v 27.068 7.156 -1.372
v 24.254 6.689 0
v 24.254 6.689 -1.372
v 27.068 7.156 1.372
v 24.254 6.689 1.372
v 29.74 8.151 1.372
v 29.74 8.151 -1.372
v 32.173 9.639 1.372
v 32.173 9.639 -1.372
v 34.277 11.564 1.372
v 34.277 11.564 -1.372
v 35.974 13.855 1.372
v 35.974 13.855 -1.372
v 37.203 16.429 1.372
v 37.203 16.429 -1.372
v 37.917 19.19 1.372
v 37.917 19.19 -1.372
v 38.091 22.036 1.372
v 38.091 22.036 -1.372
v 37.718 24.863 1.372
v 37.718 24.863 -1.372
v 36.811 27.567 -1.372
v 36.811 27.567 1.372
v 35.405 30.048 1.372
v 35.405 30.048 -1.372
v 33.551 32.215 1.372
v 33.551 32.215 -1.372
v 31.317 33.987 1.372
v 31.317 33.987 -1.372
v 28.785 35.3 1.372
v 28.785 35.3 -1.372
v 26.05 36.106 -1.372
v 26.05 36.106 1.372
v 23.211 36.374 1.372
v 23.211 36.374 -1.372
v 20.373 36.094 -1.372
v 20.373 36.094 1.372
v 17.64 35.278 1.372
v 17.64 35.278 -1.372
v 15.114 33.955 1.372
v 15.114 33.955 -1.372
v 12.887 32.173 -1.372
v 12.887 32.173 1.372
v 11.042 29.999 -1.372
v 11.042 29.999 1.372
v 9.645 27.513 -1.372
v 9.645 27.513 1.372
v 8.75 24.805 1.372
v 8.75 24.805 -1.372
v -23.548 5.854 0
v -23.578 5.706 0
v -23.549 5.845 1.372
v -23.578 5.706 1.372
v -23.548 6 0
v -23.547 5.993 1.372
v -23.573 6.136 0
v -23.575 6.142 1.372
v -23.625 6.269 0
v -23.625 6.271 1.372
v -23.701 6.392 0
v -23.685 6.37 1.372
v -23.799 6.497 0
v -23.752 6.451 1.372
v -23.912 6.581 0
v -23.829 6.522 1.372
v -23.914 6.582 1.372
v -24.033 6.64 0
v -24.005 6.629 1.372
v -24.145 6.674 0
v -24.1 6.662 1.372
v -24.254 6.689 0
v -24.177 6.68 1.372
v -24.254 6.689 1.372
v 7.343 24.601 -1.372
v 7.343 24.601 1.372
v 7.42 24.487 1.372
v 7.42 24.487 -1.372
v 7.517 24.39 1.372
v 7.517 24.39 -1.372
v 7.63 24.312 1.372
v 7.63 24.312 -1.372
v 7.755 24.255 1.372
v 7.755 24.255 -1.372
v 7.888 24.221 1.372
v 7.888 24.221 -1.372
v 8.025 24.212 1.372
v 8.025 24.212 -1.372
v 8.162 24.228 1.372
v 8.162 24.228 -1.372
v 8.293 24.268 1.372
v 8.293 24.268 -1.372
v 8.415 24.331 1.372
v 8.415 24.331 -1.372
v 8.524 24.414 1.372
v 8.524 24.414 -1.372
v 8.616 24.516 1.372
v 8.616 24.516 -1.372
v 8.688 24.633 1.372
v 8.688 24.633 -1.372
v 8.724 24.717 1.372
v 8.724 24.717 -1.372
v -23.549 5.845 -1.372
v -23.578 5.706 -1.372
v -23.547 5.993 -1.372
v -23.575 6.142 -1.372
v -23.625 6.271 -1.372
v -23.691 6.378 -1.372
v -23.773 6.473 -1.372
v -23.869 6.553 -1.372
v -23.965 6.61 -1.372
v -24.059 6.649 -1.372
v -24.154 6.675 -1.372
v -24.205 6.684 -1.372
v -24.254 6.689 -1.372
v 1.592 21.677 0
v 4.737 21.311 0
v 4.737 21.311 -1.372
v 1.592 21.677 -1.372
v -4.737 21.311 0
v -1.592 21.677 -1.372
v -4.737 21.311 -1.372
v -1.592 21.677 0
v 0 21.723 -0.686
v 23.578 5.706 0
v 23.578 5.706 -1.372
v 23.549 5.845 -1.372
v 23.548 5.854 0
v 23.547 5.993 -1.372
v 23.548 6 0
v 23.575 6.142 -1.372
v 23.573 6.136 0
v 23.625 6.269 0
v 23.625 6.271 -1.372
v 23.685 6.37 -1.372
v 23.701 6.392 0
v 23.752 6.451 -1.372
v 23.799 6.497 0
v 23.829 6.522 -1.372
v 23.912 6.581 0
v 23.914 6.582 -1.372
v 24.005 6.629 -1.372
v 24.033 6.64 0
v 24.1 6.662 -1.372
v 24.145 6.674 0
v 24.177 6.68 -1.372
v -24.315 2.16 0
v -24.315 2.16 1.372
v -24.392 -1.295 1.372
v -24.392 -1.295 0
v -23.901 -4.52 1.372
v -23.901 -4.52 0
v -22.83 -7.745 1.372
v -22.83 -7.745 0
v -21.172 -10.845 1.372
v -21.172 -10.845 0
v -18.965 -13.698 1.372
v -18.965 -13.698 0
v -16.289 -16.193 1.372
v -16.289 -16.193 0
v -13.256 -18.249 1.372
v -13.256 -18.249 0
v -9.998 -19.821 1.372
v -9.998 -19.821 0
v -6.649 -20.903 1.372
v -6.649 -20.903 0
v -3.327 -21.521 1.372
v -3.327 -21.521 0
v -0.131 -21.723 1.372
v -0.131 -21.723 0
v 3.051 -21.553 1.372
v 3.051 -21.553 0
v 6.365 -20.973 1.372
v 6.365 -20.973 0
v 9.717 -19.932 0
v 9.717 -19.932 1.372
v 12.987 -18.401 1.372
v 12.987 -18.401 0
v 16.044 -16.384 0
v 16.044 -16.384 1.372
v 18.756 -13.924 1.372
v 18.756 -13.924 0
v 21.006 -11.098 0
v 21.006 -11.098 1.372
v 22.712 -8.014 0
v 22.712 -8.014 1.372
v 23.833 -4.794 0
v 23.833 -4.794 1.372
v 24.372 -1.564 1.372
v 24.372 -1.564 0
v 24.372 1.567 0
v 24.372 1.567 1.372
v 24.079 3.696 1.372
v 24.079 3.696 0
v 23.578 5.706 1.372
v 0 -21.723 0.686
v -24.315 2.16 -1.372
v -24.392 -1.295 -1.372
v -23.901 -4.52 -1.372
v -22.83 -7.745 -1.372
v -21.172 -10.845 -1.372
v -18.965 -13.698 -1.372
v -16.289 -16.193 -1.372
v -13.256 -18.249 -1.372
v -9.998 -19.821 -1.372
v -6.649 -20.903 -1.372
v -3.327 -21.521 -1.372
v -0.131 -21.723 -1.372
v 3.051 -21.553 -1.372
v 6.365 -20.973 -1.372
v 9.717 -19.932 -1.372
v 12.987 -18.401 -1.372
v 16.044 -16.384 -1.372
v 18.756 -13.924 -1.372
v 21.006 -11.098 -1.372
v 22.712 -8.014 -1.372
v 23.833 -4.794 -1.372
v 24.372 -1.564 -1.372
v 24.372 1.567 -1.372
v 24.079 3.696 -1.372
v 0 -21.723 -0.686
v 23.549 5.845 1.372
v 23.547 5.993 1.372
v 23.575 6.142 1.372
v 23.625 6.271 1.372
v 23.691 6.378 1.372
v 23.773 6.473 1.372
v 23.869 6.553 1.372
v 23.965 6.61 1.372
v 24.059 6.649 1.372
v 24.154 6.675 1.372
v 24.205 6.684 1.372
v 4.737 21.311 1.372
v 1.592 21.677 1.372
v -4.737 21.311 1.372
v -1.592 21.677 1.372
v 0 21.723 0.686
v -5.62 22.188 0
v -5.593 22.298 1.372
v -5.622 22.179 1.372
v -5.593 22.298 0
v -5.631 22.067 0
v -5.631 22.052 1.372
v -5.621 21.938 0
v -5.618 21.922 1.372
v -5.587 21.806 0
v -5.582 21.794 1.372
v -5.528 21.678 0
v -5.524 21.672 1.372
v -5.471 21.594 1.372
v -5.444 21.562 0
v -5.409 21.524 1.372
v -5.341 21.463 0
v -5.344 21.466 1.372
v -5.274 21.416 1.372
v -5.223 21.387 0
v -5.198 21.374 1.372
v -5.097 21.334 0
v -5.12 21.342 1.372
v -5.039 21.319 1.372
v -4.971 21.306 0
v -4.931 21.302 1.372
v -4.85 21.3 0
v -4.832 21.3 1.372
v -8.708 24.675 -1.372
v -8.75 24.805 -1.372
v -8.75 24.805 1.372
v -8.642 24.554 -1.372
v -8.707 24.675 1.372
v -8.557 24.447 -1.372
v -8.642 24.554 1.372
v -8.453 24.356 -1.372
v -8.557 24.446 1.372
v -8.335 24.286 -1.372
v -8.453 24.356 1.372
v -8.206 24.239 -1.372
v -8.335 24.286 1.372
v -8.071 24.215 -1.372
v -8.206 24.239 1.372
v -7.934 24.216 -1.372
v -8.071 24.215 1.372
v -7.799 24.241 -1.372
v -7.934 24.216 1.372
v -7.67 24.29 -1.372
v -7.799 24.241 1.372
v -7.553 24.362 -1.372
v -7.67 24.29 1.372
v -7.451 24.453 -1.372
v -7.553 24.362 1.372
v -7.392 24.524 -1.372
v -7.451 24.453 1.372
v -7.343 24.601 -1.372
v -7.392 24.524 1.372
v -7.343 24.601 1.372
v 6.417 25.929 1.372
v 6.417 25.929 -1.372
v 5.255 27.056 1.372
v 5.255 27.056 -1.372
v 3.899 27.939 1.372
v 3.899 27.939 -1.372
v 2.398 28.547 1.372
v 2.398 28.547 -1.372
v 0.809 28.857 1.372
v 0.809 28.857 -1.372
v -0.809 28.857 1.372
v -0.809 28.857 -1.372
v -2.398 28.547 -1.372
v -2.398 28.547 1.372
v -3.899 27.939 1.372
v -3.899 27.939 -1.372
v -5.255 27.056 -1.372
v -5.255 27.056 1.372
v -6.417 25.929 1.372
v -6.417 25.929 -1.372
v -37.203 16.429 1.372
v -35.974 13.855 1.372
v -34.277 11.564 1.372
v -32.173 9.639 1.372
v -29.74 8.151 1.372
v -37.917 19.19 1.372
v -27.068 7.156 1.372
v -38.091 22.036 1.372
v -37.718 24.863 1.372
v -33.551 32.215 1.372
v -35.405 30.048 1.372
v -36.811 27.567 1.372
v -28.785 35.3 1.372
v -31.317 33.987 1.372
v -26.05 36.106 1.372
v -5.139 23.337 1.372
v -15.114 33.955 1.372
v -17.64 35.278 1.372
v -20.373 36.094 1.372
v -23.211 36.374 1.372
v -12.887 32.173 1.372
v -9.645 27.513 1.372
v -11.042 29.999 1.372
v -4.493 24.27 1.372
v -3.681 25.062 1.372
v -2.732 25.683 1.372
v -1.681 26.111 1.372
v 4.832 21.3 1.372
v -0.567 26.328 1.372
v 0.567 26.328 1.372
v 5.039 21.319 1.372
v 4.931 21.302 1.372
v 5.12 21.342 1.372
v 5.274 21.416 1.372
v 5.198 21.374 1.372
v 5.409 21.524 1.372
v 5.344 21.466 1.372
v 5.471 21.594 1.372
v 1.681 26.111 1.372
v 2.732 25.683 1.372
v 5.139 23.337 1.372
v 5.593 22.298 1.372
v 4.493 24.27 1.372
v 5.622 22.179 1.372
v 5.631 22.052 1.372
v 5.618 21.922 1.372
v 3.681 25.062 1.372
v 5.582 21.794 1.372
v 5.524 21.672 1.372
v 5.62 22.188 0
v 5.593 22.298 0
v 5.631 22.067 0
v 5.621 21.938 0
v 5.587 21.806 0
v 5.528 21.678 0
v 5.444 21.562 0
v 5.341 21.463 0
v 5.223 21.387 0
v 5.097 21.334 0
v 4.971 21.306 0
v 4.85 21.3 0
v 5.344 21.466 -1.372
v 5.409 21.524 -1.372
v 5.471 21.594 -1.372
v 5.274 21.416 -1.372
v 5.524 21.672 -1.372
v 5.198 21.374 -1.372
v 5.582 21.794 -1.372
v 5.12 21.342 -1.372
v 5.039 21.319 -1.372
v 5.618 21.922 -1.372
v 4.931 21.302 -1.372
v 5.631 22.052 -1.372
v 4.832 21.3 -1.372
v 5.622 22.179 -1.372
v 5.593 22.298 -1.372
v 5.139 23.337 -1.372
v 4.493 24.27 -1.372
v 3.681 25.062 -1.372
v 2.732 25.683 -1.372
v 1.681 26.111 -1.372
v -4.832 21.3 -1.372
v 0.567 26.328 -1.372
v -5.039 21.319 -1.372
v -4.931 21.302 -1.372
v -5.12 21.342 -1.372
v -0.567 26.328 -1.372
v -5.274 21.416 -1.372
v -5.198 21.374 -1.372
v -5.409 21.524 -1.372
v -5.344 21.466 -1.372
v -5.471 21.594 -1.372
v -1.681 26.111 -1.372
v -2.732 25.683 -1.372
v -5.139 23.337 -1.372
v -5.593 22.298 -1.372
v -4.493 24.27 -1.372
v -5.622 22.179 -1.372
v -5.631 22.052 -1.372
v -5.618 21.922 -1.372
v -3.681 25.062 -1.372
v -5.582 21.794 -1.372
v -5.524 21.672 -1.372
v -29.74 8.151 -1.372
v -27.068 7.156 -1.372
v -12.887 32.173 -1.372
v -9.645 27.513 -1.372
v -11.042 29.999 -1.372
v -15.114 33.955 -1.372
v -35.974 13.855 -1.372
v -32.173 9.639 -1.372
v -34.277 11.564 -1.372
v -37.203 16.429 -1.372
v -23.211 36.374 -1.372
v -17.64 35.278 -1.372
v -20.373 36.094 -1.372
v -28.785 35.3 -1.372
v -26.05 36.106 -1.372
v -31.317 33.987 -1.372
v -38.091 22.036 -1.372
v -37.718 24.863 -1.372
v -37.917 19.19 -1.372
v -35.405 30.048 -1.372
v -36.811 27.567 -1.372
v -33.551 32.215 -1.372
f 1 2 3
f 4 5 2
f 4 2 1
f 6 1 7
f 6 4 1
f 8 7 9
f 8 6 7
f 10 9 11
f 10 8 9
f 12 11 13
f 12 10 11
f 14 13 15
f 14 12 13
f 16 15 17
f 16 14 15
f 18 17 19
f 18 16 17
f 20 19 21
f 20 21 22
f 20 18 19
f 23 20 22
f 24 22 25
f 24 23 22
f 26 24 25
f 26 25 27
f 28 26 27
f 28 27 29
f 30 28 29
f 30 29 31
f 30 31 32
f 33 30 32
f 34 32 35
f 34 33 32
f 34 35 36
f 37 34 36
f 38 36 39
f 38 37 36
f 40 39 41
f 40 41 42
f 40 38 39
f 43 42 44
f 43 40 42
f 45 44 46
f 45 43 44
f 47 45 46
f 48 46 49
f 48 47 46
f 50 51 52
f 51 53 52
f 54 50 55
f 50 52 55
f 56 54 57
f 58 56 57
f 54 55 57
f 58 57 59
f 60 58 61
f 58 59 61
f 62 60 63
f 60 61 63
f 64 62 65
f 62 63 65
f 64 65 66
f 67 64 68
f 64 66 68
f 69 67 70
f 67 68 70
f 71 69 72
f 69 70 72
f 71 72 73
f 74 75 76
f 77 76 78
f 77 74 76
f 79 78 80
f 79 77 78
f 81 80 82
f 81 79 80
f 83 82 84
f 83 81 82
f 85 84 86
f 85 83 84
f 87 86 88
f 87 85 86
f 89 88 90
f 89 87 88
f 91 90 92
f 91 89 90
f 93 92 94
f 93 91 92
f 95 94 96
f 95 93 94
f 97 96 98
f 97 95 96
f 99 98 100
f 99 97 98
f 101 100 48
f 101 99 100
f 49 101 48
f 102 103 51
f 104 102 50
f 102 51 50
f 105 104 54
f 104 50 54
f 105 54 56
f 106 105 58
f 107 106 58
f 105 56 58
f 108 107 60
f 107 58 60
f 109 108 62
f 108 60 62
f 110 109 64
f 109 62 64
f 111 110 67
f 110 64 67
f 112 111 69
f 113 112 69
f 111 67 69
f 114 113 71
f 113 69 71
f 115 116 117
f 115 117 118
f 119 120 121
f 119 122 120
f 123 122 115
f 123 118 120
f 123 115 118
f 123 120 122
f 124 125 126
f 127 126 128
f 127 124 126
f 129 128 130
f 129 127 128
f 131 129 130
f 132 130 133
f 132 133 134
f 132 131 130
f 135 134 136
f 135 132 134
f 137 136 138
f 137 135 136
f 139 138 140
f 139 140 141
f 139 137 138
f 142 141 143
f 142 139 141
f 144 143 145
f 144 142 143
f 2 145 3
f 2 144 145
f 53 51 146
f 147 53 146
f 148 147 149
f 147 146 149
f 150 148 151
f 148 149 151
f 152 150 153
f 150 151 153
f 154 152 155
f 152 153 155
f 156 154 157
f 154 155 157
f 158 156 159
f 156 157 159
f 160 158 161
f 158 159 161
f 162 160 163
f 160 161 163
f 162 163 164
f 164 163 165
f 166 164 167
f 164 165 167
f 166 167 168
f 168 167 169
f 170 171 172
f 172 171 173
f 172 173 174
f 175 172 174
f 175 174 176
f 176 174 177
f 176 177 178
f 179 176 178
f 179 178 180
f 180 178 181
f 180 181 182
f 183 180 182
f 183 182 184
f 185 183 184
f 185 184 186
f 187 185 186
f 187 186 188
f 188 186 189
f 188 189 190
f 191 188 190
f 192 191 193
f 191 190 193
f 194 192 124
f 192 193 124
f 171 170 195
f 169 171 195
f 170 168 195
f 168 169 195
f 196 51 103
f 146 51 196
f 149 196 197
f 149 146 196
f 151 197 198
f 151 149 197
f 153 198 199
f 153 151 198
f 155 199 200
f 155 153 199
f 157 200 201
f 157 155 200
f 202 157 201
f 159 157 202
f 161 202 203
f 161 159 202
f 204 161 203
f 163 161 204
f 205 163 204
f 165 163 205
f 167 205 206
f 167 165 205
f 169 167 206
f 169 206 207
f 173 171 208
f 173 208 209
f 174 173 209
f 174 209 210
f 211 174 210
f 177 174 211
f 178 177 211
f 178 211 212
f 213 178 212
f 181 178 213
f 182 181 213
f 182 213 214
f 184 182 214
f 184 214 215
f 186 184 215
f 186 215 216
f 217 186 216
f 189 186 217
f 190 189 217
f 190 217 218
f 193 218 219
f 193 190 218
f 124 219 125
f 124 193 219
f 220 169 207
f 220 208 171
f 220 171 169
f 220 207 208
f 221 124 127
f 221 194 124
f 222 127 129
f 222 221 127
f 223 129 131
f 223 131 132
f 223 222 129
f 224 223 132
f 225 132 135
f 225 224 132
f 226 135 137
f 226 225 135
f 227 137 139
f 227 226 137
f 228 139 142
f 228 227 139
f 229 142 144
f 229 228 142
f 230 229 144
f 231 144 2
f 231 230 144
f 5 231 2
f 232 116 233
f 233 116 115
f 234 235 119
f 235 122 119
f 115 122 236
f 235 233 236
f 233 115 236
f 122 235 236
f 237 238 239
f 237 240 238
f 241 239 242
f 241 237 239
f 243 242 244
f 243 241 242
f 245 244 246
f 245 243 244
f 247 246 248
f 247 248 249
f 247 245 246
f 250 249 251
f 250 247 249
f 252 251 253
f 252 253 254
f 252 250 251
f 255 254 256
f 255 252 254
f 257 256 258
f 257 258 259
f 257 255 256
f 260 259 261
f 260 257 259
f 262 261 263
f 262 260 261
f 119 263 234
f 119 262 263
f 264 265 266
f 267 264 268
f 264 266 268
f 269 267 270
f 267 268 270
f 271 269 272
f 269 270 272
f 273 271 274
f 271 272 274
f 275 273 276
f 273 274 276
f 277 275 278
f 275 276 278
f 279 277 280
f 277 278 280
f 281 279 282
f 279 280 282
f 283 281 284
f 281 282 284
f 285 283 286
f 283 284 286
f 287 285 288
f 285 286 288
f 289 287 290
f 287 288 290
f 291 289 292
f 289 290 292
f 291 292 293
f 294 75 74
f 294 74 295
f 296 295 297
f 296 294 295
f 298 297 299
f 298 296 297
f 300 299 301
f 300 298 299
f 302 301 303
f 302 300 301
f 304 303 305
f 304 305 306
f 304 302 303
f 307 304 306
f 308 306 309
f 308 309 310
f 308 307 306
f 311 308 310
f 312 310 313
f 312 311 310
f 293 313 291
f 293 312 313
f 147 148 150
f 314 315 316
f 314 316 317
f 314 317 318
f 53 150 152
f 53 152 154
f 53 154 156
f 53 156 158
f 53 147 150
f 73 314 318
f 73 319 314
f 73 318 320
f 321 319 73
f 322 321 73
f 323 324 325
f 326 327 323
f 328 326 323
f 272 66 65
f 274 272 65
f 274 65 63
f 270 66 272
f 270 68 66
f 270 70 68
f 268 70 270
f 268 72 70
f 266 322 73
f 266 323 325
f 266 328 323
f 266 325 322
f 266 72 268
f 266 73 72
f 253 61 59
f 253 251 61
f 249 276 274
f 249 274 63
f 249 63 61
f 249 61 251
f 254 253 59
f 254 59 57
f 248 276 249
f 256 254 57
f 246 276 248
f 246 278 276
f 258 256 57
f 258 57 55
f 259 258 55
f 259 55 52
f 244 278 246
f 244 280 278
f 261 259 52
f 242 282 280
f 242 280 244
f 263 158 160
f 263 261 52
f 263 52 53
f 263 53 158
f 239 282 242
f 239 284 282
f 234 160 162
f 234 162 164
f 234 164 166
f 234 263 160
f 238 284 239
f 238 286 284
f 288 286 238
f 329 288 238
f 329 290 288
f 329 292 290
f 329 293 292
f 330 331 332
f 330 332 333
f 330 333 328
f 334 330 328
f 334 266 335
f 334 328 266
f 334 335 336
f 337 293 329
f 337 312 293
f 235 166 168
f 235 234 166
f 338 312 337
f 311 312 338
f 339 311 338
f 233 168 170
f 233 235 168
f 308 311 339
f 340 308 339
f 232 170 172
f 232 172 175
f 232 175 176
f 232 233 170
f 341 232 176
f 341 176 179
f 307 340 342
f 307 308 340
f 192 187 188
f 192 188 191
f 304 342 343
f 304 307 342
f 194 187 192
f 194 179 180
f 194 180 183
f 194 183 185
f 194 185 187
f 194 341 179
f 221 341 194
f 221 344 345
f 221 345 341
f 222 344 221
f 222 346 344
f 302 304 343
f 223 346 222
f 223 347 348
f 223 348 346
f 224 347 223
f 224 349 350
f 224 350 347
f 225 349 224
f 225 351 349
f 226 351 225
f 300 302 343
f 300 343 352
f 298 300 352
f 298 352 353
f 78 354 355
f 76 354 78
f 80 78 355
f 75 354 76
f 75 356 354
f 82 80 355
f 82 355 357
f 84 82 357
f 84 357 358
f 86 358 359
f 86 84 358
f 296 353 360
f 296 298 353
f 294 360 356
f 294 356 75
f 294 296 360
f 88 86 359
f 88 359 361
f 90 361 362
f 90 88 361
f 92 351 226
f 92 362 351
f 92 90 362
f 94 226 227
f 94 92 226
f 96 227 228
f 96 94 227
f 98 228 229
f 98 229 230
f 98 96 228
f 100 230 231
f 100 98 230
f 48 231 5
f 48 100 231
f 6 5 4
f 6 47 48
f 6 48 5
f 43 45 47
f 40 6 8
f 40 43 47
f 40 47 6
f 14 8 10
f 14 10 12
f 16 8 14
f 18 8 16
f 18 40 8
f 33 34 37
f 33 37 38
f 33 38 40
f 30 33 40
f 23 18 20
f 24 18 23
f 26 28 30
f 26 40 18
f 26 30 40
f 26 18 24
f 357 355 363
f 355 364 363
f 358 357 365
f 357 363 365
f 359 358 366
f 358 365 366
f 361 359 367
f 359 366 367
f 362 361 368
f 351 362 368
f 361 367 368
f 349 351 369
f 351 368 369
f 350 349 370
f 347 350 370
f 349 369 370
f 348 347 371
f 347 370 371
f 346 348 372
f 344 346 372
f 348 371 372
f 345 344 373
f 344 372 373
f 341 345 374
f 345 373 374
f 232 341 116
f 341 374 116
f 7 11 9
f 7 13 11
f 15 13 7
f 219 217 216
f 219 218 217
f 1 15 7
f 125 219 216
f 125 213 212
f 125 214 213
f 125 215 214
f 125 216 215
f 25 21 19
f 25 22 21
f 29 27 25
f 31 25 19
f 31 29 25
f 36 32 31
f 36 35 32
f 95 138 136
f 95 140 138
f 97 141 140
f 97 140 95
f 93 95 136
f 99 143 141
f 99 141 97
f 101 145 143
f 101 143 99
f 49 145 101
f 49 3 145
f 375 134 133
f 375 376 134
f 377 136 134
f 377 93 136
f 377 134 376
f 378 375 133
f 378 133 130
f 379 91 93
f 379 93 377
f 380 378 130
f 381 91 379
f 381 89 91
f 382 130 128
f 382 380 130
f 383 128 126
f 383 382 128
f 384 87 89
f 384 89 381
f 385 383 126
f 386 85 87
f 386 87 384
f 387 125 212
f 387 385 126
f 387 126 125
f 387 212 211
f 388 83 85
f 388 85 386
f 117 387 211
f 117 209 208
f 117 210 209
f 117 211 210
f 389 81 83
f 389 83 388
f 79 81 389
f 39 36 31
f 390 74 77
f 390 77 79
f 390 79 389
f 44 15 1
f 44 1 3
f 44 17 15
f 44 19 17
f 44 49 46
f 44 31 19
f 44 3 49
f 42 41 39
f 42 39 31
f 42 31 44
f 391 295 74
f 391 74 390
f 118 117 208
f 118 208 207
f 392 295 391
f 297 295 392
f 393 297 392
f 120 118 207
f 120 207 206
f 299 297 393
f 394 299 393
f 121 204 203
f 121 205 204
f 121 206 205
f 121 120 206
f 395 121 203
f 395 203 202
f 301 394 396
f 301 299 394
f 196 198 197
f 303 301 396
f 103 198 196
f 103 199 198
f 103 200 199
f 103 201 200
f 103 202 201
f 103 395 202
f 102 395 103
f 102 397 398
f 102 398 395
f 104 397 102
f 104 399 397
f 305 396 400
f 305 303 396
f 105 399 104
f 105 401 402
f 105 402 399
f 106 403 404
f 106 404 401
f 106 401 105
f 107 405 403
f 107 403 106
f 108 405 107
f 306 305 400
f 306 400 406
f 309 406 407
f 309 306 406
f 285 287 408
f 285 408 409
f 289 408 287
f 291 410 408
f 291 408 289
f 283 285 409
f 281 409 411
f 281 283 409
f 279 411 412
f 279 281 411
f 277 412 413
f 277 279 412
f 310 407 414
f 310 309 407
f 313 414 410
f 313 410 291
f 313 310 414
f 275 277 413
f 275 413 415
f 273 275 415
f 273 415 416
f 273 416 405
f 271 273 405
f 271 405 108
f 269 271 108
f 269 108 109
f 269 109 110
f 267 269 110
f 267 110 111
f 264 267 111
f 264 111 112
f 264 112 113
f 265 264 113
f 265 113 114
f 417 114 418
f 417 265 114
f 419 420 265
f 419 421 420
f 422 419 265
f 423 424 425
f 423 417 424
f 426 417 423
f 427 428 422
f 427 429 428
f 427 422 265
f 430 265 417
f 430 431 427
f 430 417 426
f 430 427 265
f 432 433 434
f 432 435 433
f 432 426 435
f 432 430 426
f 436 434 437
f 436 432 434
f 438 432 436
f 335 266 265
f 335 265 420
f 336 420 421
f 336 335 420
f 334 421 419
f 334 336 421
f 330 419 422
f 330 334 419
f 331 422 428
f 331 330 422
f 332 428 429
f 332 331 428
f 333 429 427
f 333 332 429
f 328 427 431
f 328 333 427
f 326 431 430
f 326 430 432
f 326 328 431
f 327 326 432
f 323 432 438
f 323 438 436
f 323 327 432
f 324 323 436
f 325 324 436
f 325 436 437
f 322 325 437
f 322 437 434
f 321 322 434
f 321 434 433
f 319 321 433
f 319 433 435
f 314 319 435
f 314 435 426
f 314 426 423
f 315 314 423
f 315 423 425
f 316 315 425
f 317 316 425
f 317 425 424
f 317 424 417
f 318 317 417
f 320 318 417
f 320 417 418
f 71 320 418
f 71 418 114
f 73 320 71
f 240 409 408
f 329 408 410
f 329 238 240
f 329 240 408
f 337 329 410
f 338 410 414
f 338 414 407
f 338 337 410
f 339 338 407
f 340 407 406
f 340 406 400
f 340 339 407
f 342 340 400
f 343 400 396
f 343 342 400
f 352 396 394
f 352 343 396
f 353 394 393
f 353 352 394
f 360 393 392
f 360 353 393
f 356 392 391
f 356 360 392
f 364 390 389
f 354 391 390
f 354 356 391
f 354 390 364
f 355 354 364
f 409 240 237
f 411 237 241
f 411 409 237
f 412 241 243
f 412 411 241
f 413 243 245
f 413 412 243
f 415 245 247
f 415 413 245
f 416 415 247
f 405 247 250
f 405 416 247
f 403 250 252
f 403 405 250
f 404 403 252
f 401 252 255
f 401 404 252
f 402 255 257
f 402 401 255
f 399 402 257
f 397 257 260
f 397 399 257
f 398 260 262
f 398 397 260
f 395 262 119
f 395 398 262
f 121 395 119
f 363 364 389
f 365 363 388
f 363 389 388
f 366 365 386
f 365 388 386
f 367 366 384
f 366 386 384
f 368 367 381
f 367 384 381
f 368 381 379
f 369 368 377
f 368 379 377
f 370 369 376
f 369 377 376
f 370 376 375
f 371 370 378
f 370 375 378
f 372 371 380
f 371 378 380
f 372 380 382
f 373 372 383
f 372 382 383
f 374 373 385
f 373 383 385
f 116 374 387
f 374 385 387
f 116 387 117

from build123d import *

# Parameters (mm, degrees)
F1_DEPTH      = 1.3716
F3_DEPTH      = 1.3716
F3_DEPTH_BACK = 1.3716
F4_R          = 0.762


# Not quite as in the source:
# - a feature names something its author has since deleted; it is built from what else it names


with BuildPart() as f1:
    # F0 (on Top) → F1 (new body, symmetric)
    with BuildSketch(Plane.XY):
        with BuildLine():
            ThreePointArc((-8.4232286975, 20.3914902339), (-33.3355583029, 32.417888511), (-23.260879727, 6.6543624814))
            add(Edge.make_bspline(
                [(-23.260879727, 6.6543624814), (-33.5330229603, -21.7229145667), (0, -21.7229145667), (33.5330229603, -21.7229145667), (23.260879727, 6.6543624814)],
                knots=[2.8302582369, 2.8302582369, 2.8302582369, 4.7123889804, 4.7123889804, 6.5945197238, 6.5945197238, 6.5945197238], degree=2, weights=[1, 0.5889273409, 1, 0.5889273409, 1]))
            ThreePointArc((23.260879727, 6.6543624814), (33.3355583029, 32.417888511), (8.4232286975, 20.3914902339))
            add(Edge.make_bspline(
                [(8.4232286975, 20.3914902339), (0, 23.1412717688), (-8.4232286975, 20.3914902339)],
                knots=[1.2188651396, 1.2188651396, 1.2188651396, 1.922727514, 1.922727514, 1.922727514], degree=2, weights=[1, 0.9387087617, 1]))
        make_face()
    extrude(amount=F1_DEPTH, both=True)

    # F2 (on Top) → F3 (join, two sides)
    with BuildSketch(Plane.XY) as f3_sk:
        with BuildLine():
            add(Edge.make_bspline(
                [(8.4232286975, 20.3914902339), (7.1587937107, 20.8042678164), (5.8509839512, 21.0909933818)],
                knots=[1.2188651396, 1.2188651396, 1.2188651396, 1.3290021299, 1.3290021299, 1.3290021299], degree=2, weights=[1, 0.9984841136, 1]))
            ThreePointArc((8.4232286975, 20.3914902339), (0, 28.8958069319), (-8.4232286975, 20.3914902339))
            add(Edge.make_bspline(
                [(-5.8509839512, 21.0909933818), (-7.1587937107, 20.8042678164), (-8.4232286975, 20.3914902339)],
                knots=[1.8125905237, 1.8125905237, 1.8125905237, 1.922727514, 1.922727514, 1.922727514], degree=2, weights=[1, 0.9984841136, 1]))
            ThreePointArc((-5.8509839512, 21.0909933818), (0, 26.3558069319), (5.8509839512, 21.0909933818))
        make_face()
    extrude(amount=F3_DEPTH)
    extrude(f3_sk.sketch, amount=-F3_DEPTH_BACK)

    # F4
    f4_edges = [f1.edges().sort_by_distance(p)[0] for p in [
        (5.850984, 21.090993, -0.6858),
        (-5.850984, 21.090993, -0.6858),
        (23.26088, 6.654362, 0.6858),
        (23.26088, 6.654362, -0.6858),
        (-23.26088, 6.654362, 0.6858),
        (-23.26088, 6.654362, -0.6858),
        (8.382226, 21.306212, 0),
        (-8.382226, 21.306212, 0),
        (-5.850984, 21.090993, 0.6858),
        (5.850984, 21.090993, 0.6858),
    ]]
    fillet(f4_edges, radius=F4_R)


solid = f1.part
